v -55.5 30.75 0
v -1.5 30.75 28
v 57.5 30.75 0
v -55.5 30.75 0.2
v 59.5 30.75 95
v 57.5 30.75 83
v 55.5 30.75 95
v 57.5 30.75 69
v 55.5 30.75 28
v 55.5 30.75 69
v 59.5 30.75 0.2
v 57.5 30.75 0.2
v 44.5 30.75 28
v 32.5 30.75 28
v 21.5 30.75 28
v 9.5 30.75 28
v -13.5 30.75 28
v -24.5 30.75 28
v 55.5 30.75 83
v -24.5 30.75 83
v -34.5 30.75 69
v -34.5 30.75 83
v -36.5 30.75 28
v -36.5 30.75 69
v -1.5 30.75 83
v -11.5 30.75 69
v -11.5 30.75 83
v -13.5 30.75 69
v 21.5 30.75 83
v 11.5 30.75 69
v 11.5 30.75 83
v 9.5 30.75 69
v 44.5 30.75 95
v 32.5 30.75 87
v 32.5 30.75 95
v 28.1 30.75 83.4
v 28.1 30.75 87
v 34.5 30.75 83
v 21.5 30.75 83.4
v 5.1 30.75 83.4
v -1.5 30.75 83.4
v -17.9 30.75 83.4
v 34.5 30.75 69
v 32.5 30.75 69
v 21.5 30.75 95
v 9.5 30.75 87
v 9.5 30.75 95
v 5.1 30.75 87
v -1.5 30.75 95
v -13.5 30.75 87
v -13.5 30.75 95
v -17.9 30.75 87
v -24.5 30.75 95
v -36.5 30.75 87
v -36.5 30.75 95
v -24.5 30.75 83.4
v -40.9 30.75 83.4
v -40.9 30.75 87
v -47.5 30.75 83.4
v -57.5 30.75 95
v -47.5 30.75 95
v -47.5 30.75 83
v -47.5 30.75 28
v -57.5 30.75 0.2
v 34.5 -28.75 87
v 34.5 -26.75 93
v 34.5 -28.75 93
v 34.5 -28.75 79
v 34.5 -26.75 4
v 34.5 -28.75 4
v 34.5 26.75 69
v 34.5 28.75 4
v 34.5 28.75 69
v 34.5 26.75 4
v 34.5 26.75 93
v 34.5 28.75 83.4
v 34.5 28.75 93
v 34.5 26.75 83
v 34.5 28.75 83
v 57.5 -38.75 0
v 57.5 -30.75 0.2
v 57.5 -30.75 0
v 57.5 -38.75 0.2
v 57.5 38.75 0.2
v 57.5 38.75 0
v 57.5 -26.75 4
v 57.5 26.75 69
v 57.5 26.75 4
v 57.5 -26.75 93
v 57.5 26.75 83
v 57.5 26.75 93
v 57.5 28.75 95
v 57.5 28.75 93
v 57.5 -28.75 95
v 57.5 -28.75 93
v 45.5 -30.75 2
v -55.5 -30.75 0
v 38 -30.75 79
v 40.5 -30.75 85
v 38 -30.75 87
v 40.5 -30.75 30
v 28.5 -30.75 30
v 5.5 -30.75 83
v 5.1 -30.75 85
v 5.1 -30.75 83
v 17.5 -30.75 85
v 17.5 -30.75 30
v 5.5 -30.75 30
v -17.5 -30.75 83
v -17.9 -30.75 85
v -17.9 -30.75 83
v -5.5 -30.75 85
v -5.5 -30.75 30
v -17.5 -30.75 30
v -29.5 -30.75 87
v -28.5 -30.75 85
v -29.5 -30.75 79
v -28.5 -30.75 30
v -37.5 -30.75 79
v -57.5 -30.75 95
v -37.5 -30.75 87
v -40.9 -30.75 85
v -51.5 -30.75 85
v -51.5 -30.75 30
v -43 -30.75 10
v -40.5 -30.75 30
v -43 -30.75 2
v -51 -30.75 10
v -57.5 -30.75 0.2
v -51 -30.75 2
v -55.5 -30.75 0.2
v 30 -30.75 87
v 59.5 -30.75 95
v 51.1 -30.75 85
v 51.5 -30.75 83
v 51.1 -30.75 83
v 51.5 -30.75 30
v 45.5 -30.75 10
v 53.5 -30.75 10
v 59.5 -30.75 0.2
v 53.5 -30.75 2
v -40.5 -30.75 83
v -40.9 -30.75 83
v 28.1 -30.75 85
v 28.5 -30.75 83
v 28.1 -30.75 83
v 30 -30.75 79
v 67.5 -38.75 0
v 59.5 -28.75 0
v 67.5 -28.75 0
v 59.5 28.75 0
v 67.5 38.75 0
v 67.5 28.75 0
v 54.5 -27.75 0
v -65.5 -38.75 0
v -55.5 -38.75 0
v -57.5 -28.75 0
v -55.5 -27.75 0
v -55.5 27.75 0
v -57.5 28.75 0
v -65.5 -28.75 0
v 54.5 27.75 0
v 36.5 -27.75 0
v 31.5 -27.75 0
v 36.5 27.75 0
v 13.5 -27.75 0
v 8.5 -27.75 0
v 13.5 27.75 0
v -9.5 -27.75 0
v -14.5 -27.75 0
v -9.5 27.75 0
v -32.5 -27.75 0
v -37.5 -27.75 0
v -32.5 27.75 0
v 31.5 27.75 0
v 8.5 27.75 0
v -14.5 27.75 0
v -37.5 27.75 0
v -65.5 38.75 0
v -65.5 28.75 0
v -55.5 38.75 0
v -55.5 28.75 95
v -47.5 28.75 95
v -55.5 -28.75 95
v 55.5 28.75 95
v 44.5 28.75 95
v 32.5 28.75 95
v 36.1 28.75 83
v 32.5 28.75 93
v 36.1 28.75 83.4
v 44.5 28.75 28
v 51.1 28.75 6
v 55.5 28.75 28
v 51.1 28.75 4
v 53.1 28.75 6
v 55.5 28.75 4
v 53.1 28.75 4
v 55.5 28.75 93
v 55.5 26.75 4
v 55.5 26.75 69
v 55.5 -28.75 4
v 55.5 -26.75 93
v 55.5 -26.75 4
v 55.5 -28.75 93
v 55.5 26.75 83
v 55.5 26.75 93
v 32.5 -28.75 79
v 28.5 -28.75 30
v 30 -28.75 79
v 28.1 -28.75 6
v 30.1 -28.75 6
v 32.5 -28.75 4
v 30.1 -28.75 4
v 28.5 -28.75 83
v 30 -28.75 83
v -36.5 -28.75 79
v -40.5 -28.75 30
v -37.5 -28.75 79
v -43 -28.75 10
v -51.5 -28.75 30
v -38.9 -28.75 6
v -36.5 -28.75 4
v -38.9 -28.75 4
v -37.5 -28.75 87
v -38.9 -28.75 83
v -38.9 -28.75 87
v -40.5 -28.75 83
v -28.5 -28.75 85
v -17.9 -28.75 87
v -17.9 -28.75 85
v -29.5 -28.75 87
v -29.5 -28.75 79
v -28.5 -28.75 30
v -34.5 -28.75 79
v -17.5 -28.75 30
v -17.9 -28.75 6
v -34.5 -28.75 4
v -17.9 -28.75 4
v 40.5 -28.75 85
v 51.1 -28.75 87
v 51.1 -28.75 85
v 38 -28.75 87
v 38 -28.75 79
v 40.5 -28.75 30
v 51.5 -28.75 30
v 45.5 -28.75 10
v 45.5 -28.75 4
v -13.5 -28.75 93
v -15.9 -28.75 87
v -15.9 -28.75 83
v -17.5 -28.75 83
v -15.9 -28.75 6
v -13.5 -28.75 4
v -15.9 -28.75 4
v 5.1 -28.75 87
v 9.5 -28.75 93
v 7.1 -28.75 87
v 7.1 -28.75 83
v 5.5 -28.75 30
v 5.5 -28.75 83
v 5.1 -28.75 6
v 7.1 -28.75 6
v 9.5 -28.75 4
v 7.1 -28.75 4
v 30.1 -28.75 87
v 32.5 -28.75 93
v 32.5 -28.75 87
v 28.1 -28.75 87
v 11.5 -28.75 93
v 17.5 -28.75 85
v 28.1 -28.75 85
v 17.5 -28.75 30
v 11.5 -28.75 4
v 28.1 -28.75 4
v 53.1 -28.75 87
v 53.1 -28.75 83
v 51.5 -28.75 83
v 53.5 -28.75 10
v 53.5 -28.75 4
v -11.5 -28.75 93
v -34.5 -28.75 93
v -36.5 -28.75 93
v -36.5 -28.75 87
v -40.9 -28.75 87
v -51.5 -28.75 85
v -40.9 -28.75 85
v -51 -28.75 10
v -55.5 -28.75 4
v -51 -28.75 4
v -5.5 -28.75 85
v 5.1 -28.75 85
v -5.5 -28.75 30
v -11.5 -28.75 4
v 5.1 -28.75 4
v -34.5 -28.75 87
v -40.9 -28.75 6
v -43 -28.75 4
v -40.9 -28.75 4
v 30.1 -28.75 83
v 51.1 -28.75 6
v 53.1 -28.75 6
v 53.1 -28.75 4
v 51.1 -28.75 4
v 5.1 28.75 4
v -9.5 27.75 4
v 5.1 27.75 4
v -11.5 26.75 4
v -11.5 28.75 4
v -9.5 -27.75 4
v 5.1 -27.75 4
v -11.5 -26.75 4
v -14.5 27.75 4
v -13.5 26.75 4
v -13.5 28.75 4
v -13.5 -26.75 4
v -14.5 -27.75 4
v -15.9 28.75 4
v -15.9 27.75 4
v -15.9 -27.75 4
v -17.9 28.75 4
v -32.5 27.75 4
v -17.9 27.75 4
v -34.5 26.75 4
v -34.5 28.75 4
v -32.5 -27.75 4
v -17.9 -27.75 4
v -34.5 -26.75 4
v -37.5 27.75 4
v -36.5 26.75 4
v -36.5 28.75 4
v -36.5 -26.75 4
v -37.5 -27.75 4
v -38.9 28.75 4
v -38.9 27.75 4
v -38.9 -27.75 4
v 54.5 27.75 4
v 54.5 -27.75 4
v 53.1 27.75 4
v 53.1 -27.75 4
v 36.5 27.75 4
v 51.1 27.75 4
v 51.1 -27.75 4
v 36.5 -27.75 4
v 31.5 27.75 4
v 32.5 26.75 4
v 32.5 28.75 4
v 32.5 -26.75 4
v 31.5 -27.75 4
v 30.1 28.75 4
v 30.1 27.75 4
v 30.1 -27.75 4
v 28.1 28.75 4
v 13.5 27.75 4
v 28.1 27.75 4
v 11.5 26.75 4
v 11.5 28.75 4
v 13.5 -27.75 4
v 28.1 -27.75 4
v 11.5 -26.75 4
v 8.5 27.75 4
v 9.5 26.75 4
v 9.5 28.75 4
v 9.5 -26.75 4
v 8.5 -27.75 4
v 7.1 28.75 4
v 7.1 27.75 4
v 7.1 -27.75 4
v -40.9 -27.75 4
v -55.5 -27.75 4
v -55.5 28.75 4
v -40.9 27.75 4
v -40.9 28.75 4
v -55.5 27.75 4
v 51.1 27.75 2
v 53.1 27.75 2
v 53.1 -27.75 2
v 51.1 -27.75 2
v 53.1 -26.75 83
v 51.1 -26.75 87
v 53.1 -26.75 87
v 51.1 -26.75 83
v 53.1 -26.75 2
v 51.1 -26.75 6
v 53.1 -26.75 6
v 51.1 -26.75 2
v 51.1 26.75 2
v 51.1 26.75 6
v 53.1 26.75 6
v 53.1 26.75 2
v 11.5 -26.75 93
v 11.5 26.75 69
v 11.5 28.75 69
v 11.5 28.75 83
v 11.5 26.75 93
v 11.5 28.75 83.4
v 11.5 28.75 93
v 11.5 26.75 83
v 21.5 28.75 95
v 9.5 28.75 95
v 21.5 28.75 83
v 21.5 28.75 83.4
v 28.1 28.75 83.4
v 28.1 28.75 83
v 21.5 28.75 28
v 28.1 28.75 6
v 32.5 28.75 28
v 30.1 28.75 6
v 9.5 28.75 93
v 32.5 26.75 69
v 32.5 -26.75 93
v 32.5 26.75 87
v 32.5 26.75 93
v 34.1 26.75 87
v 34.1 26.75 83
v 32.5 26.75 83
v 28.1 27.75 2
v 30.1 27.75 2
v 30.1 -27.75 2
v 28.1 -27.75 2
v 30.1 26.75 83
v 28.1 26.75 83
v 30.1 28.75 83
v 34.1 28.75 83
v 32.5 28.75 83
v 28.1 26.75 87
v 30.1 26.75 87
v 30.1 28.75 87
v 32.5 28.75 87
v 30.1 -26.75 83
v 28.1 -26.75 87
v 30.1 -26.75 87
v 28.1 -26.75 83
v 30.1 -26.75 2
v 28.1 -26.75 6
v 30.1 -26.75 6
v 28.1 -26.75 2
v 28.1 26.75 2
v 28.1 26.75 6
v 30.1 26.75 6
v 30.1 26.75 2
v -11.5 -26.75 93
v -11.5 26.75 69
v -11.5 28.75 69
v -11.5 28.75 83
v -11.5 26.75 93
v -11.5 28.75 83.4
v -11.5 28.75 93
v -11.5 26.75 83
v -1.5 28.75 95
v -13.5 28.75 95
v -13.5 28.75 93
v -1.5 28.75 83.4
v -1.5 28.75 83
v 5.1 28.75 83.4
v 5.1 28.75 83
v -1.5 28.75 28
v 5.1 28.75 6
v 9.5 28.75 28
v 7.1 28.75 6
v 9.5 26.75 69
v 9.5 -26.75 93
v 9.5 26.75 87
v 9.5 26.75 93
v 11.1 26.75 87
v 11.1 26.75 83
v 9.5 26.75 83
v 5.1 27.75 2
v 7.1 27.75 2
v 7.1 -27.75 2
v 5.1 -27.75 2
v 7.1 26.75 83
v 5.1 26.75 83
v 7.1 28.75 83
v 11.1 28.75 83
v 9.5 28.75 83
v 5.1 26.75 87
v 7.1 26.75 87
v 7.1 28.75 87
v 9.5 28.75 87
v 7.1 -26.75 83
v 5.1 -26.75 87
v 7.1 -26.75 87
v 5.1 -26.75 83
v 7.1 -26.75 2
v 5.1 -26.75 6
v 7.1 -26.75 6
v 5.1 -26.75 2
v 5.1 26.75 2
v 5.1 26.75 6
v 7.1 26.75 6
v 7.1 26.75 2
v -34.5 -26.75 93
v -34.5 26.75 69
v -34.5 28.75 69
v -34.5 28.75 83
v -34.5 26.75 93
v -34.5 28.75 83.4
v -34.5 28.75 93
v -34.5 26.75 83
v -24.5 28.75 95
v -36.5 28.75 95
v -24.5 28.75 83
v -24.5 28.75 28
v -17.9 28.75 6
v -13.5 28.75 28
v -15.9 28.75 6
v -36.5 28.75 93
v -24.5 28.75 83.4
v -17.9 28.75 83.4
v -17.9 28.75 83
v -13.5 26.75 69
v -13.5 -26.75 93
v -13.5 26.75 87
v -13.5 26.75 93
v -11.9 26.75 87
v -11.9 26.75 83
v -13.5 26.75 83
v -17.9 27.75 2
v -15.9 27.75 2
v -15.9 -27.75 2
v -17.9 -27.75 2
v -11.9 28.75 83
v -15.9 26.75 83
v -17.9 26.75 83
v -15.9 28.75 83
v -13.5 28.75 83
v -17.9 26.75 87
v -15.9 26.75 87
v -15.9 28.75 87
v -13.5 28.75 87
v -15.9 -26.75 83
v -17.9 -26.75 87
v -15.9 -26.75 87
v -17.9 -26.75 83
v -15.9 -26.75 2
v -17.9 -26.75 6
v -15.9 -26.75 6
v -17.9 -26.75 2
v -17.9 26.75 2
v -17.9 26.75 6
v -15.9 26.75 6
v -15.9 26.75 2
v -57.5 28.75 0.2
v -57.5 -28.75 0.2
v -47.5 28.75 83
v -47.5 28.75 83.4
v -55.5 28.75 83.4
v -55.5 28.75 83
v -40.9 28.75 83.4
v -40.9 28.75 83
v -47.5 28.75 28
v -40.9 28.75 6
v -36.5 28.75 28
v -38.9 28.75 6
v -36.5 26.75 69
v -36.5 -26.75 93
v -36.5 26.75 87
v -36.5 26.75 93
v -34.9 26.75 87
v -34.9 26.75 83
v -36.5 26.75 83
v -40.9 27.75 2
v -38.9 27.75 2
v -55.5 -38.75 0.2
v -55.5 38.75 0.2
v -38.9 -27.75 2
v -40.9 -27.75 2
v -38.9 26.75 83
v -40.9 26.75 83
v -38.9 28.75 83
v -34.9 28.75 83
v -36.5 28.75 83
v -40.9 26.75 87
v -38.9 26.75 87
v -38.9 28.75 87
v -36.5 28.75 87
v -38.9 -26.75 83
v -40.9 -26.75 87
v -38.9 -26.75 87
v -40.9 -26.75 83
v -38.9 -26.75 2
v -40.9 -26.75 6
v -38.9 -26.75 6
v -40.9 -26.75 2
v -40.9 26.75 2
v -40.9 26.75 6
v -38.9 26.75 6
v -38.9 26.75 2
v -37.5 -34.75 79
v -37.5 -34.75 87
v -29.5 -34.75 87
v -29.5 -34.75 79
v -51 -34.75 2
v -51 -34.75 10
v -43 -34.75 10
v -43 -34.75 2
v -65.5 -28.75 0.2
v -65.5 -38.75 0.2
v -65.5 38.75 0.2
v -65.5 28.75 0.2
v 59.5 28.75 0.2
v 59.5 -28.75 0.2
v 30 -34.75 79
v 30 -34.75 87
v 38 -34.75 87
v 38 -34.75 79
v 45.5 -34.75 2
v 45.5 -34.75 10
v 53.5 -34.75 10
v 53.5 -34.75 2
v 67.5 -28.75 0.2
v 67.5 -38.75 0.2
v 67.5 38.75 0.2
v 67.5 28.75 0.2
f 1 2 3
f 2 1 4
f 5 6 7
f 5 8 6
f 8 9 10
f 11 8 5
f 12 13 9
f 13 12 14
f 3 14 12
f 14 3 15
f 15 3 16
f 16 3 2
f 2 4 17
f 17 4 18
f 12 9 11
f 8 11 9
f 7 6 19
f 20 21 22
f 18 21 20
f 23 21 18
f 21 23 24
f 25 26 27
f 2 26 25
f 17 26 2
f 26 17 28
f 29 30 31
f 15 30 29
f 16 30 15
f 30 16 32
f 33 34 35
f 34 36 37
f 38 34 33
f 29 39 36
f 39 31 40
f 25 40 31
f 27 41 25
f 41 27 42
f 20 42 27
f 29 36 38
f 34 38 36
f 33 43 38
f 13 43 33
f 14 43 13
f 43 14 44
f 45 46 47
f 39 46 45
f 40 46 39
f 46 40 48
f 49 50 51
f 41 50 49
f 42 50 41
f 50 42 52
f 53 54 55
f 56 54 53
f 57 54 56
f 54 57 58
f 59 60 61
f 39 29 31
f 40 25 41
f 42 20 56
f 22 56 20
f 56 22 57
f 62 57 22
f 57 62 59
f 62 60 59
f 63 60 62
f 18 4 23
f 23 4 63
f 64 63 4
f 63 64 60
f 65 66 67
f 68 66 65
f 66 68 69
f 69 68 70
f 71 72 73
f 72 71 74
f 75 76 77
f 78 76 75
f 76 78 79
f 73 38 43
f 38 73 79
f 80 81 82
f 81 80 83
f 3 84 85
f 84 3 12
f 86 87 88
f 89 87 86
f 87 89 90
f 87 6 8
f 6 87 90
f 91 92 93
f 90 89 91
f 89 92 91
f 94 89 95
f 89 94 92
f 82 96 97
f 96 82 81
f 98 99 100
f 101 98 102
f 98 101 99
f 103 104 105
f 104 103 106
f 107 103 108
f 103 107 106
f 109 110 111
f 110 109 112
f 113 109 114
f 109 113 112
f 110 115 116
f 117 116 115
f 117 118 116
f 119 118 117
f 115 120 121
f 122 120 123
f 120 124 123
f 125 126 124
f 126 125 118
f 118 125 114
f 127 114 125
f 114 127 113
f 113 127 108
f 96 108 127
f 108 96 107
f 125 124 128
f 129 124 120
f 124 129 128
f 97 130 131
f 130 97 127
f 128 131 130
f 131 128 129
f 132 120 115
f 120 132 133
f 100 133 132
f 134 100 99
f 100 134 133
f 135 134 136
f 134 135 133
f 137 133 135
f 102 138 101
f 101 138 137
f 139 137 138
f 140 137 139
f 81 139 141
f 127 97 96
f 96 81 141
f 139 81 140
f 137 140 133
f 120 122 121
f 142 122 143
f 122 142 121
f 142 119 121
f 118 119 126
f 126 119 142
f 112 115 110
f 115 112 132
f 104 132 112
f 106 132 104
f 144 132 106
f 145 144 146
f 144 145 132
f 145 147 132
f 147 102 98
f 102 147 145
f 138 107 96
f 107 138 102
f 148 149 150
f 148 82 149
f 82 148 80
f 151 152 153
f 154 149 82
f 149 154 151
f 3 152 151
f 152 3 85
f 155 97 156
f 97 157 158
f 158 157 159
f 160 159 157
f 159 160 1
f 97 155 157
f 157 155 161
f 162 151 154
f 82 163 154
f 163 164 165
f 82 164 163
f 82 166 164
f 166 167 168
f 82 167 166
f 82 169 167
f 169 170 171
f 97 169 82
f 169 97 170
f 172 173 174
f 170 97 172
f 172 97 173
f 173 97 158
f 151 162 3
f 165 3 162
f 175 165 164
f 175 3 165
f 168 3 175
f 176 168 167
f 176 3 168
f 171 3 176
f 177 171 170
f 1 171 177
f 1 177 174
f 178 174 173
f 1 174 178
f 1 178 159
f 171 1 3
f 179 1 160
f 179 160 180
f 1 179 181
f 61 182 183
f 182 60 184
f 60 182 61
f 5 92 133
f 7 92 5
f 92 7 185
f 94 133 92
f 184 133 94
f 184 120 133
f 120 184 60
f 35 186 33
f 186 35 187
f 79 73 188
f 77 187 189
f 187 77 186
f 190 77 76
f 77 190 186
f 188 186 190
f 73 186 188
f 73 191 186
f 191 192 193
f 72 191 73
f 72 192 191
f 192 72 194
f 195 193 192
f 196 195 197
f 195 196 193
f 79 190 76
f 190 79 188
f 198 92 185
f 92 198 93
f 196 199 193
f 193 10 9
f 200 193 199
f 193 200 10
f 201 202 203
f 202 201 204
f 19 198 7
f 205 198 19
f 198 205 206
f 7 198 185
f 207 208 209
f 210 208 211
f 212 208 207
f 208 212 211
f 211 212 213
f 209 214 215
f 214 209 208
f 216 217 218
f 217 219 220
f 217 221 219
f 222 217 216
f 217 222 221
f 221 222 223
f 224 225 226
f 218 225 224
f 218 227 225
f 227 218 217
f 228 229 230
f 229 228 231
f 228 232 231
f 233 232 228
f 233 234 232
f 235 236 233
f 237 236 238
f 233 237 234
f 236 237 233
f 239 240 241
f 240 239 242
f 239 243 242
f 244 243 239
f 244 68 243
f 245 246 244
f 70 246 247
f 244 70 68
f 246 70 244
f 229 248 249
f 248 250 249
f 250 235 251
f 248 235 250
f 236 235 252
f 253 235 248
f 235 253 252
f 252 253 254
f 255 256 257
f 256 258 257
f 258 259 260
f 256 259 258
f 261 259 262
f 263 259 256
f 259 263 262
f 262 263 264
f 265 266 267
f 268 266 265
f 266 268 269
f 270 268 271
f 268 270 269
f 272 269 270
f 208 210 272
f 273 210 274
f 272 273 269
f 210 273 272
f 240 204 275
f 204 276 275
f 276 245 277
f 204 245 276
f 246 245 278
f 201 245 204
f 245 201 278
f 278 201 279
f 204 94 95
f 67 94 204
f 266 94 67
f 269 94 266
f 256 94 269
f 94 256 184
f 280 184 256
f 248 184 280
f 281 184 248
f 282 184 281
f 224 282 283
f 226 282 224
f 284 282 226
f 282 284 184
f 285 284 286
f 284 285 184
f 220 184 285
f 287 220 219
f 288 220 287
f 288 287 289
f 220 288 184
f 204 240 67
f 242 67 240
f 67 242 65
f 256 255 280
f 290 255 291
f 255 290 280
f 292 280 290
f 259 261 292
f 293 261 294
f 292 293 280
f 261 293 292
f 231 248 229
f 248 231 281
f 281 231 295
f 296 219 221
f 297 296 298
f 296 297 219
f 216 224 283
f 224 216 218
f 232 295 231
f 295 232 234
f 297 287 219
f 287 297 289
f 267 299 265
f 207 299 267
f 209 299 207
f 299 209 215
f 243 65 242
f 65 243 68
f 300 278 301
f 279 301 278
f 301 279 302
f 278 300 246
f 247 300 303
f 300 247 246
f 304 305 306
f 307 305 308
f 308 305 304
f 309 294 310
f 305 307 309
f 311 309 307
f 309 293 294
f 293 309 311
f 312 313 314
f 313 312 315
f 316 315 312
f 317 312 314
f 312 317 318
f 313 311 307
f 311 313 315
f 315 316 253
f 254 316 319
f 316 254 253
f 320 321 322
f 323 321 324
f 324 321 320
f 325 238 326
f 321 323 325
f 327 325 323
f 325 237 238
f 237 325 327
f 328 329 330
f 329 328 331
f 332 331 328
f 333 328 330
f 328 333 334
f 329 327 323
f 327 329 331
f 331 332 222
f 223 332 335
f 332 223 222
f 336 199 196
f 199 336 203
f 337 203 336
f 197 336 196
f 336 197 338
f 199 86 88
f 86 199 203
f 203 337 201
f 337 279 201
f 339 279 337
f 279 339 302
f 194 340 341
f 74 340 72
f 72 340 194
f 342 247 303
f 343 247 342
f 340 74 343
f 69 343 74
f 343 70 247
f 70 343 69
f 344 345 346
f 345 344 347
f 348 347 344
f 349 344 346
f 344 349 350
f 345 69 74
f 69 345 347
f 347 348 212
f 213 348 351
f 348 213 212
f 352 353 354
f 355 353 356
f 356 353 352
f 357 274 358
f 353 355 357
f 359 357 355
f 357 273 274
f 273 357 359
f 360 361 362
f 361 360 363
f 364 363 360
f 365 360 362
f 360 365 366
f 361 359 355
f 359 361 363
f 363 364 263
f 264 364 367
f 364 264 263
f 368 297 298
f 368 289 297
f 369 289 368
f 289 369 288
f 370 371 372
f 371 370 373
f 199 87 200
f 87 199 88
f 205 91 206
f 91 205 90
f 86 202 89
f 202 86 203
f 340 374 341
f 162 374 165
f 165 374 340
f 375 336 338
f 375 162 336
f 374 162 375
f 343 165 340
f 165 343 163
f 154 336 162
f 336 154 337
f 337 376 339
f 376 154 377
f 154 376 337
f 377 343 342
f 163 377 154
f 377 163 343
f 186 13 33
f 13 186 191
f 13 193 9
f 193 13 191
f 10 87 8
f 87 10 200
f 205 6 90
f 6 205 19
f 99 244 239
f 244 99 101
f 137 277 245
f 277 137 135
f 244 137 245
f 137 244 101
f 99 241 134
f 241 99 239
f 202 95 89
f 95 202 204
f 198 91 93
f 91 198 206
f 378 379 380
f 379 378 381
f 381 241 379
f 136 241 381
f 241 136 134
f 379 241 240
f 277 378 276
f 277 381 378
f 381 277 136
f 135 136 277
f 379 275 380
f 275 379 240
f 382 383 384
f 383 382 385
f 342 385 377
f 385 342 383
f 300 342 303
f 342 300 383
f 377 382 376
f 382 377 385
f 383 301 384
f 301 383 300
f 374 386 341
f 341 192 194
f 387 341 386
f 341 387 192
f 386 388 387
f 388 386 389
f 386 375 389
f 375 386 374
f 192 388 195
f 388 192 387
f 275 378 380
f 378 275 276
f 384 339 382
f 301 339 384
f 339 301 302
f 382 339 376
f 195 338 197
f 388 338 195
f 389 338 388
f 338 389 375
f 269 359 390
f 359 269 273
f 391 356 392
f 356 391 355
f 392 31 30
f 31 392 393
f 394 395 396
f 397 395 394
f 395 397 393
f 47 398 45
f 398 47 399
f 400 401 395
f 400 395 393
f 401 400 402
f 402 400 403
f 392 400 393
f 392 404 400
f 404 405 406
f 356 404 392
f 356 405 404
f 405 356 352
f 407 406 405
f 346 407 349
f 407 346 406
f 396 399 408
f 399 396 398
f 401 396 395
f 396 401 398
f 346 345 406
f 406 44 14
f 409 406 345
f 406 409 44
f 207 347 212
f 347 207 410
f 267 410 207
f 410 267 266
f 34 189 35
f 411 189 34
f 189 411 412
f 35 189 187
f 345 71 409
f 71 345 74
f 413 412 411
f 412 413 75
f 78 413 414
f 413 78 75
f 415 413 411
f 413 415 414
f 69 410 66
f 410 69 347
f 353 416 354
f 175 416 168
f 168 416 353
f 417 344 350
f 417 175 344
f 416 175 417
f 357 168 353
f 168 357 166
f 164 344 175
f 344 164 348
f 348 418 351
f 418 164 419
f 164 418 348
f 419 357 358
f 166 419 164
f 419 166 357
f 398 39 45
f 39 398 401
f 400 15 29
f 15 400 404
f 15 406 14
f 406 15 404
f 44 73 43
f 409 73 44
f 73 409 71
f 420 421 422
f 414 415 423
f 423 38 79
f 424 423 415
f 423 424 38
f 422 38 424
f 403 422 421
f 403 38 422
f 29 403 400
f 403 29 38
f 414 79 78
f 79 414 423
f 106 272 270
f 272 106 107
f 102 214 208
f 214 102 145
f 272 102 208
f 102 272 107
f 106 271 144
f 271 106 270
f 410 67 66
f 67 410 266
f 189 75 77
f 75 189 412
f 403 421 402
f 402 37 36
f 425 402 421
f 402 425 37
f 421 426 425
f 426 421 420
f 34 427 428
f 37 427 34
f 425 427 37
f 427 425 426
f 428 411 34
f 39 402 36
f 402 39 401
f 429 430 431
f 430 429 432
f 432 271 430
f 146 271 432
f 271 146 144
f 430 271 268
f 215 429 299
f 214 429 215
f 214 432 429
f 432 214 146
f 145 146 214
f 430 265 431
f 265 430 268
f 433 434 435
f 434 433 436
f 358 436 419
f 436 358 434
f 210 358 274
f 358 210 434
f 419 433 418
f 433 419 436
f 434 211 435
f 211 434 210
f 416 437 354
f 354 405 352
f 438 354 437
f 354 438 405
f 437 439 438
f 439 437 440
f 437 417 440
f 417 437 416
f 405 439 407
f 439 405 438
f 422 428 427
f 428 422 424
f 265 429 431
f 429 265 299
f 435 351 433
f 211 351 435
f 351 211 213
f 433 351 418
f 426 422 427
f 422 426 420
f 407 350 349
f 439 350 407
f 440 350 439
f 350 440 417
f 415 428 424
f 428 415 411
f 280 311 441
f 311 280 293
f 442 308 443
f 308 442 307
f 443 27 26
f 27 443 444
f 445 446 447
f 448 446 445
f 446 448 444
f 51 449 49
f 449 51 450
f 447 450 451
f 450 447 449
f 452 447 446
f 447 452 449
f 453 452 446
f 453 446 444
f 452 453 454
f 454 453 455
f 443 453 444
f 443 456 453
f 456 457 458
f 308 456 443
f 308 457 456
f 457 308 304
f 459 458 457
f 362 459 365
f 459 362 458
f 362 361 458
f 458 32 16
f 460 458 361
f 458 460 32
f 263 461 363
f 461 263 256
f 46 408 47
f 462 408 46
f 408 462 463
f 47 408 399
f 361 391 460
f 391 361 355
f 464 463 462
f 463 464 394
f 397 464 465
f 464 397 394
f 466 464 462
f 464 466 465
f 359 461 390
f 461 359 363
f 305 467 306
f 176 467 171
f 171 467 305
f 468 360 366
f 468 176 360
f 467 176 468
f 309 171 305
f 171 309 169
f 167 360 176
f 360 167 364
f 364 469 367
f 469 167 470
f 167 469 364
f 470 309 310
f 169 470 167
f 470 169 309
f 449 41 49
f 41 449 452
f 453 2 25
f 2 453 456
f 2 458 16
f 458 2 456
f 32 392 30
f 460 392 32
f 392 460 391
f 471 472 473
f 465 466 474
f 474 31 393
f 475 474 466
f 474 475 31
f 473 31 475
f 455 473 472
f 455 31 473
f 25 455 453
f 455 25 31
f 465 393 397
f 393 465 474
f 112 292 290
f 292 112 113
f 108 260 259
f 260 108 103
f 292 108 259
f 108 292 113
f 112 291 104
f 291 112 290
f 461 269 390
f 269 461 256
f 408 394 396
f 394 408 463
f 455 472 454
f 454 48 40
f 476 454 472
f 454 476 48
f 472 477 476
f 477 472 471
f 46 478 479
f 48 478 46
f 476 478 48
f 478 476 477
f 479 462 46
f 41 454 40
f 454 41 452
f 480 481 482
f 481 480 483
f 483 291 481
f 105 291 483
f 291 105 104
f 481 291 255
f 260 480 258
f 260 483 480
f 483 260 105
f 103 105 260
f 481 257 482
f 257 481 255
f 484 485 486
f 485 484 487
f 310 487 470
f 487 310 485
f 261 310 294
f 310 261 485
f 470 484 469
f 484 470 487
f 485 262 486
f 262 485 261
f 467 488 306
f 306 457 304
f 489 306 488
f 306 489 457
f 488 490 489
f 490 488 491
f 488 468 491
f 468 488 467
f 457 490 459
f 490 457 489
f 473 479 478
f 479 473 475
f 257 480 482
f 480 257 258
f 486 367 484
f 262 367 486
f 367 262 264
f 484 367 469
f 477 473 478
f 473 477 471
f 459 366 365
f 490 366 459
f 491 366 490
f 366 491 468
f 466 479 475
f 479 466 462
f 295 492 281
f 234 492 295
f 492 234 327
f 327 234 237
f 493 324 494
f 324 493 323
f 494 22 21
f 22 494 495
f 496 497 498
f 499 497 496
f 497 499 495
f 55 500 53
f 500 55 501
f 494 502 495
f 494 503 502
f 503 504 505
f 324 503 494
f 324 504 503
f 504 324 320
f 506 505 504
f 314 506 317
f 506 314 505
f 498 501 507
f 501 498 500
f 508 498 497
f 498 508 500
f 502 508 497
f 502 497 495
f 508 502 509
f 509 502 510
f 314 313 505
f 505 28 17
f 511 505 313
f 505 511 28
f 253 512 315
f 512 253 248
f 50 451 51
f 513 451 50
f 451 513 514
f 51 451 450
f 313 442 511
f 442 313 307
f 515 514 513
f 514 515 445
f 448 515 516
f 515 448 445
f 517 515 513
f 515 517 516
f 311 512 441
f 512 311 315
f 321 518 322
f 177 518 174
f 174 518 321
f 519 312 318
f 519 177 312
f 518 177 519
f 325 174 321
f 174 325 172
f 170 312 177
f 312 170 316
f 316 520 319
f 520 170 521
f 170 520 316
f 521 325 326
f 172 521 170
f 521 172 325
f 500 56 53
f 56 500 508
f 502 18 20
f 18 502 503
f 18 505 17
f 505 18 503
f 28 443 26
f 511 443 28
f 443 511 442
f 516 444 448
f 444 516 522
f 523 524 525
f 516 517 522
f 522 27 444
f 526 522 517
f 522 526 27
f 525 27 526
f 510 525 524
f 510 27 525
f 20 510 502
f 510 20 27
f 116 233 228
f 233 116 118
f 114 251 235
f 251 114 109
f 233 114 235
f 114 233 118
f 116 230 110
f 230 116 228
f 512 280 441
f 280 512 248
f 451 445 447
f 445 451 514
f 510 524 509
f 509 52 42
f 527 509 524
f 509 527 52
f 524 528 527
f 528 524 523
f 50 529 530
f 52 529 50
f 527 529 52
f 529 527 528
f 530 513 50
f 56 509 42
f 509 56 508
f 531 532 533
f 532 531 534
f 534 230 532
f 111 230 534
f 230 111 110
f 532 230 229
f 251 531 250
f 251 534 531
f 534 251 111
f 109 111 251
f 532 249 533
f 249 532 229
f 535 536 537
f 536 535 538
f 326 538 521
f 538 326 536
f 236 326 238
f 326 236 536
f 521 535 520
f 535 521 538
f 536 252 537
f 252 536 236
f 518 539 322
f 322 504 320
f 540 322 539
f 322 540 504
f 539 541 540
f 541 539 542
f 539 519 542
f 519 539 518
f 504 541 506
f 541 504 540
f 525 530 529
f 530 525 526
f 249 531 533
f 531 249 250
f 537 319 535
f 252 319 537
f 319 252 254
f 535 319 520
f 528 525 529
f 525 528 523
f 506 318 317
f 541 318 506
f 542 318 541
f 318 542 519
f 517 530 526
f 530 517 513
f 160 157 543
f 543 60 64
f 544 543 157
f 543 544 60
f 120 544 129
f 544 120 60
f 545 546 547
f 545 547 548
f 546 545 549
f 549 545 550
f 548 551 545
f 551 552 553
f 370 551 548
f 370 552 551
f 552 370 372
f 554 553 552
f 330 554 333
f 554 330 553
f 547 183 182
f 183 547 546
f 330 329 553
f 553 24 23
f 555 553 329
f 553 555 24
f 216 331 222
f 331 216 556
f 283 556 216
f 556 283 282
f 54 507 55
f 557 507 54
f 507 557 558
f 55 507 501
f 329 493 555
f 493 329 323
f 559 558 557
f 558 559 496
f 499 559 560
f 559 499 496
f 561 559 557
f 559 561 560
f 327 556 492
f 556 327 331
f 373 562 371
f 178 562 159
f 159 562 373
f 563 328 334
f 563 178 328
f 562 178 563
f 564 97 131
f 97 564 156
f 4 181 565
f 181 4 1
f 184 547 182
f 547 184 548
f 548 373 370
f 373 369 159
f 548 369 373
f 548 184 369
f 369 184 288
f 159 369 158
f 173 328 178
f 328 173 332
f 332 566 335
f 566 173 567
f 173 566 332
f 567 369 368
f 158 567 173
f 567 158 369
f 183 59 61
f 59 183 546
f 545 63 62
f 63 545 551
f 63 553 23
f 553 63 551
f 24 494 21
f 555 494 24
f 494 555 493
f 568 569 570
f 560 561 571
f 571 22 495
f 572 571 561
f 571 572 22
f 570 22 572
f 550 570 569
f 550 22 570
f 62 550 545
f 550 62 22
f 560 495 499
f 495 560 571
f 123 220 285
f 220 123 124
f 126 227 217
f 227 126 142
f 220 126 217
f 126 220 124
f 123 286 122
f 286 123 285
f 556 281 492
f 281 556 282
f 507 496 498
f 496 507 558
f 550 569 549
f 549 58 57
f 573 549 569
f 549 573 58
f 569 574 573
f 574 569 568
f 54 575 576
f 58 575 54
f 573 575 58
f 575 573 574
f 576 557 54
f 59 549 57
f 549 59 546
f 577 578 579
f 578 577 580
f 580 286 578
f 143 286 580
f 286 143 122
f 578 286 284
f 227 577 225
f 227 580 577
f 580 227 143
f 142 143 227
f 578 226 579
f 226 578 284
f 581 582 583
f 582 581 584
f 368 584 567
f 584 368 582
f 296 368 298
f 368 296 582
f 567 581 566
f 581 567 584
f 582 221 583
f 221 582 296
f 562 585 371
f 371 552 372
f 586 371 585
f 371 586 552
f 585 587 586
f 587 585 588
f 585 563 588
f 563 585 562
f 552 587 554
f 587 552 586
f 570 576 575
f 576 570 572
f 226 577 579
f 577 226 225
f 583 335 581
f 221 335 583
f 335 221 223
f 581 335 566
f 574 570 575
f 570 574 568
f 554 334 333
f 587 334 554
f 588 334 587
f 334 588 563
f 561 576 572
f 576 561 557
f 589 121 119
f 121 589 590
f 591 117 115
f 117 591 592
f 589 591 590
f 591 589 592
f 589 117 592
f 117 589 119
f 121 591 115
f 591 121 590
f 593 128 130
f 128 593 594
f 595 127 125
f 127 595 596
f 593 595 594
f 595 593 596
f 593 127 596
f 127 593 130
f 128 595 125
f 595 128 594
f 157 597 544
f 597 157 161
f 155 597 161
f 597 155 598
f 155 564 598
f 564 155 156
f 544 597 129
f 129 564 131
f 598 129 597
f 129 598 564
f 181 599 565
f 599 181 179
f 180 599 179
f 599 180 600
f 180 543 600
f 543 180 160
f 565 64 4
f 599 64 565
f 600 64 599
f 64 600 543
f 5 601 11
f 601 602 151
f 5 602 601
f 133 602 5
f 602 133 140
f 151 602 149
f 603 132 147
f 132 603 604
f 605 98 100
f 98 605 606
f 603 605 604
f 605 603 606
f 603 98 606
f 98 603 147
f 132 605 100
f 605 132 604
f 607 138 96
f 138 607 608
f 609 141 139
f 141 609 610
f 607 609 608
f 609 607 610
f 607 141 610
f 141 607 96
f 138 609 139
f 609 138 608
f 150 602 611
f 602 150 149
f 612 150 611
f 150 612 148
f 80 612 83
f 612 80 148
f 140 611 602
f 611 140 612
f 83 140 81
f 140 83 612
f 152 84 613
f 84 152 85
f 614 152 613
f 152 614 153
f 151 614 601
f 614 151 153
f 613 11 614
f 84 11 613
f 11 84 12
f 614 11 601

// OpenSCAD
//preview[view:east, tilt:top]

/* A remix of http://www.thingiverse.com/thing:664343 designed to:
   - put boards upright and hold them in place
   - provide minimal convection airflow
   - provide some headroom to prevent bumping the Micro SD card */

/* [Global] */
//how many raspis to stack on each other
rack_height=5; //[1:10]


/* [Hidden] */
rpi_width=57.5;
rpi_length=87;
u_height=23;
wall=2;
ledge=2;
port_height=11;
port_len=61;

module rack_side(){
    translate([0,-3*wall,-wall])
        cube([rpi_width+2*wall,rpi_length+wall*4,wall]);
}

module one_u(){
    difference(){
        translate([0,-wall*3,0])
            cube([rpi_width+2*wall,rpi_length+wall*4,u_height]);

        // cut out main area
        translate([wall,-wall*5,wall])
            cube([rpi_width,rpi_length+wall*4,u_height]);
        //cut floor
        translate([wall+ledge,-wall*4,-wall])
            cube([rpi_width-2*ledge,rpi_length+wall*3,3*wall]);
        //back
        translate([wall+1,rpi_length-2*wall,ledge+1])
            cube([rpi_width-2,5*wall,u_height-1-2*wall]);
        //top ports
        translate([rpi_width,-wall*4,wall])
            cube([5*wall,port_len+wall*4,port_height]);
        //power plug clearance
        translate([rpi_width-wall,wall*3,-wall])
            cube([4*wall,wall*7,port_height-wall*2]);
        //bottom ports
        translate([-wall,wall*2,wall*3])
            cube([3*wall,port_len-wall*3,port_height]);
        // remove leading edge of rails
        translate([wall,-wall*4,-wall])
            cube([rpi_width,wall*2,u_height]);
    }
}

module board_clips(index) {
    translate([0,wall,wall*1.2])
        difference(){
            union() {
                cube([2*wall,2*wall,2*wall]);
                if(index>1) {/* remove top clip so board will slide in */
                    translate([rpi_width,0,-wall])
                        cube([2*wall,2*wall,3*wall]);
                	    // breakaway support
	                translate([rpi_width+wall,wall*2-0.4,-wall*2])
    		                cube([wall,0.4,u_height]);
                }
                translate([0,rpi_length-wall*3,0])
                    cube([2*wall,2*wall,2*wall]);
                translate([rpi_width,rpi_length-wall*3,0])
                    cube([2*wall,2*wall,2*wall]);
            }
            translate([0,-wall,-0.4])
                cube([rpi_width+wall,rpi_length+2*wall,wall*1.2]);
        }
}

module raspi_rack(){
    rack_side();
    for(i=[1:rack_height]){
        translate([0,0,(i-1)*u_height])
            one_u();
        translate([0,0,(i-1)*u_height])
            board_clips(i);
    }
    // mirror side
    translate([0,0,rack_height*u_height])
        rack_side();
    // feet
    translate([-wall*2,wall,u_height/2+wall*4])
        cube([3*wall,4*wall,4*wall]);
    translate([-wall*2,rpi_length-4*wall,wall*2])
        cube([3*wall,4*wall,4*wall]);
    translate([0,0,rack_height*u_height-wall*13]){
        translate([-wall*2,wall,-wall])
            cube([3*wall,4*wall,4*wall]);
        translate([-wall*2,rpi_length-4*wall,u_height/2])
            cube([3*wall,4*wall,4*wall]);
    }
    // adhesion pads to prevent warping
    translate([-wall*4,rpi_length+wall-0.2,-wall*5])
        cube([10,0.2,10]);
    translate([rpi_width+wall,rpi_length+wall-0.2,-wall*5])
        cube([10,0.2,10]);
	translate([0,0,rack_height*u_height+wall*4]) {
    		translate([-wall*4,rpi_length+wall-0.2,-wall*5])
            cube([10,0.2,10]);
    		translate([rpi_width+wall,rpi_length+wall-0.2,-wall*5])
            cube([10,0.2,10]);
    }
    
}

//rotate & center
translate([(rack_height*u_height)/2,-(rpi_width+2*wall)/2,rpi_length+wall])
    rotate([-90,0,90])
        raspi_rack();
